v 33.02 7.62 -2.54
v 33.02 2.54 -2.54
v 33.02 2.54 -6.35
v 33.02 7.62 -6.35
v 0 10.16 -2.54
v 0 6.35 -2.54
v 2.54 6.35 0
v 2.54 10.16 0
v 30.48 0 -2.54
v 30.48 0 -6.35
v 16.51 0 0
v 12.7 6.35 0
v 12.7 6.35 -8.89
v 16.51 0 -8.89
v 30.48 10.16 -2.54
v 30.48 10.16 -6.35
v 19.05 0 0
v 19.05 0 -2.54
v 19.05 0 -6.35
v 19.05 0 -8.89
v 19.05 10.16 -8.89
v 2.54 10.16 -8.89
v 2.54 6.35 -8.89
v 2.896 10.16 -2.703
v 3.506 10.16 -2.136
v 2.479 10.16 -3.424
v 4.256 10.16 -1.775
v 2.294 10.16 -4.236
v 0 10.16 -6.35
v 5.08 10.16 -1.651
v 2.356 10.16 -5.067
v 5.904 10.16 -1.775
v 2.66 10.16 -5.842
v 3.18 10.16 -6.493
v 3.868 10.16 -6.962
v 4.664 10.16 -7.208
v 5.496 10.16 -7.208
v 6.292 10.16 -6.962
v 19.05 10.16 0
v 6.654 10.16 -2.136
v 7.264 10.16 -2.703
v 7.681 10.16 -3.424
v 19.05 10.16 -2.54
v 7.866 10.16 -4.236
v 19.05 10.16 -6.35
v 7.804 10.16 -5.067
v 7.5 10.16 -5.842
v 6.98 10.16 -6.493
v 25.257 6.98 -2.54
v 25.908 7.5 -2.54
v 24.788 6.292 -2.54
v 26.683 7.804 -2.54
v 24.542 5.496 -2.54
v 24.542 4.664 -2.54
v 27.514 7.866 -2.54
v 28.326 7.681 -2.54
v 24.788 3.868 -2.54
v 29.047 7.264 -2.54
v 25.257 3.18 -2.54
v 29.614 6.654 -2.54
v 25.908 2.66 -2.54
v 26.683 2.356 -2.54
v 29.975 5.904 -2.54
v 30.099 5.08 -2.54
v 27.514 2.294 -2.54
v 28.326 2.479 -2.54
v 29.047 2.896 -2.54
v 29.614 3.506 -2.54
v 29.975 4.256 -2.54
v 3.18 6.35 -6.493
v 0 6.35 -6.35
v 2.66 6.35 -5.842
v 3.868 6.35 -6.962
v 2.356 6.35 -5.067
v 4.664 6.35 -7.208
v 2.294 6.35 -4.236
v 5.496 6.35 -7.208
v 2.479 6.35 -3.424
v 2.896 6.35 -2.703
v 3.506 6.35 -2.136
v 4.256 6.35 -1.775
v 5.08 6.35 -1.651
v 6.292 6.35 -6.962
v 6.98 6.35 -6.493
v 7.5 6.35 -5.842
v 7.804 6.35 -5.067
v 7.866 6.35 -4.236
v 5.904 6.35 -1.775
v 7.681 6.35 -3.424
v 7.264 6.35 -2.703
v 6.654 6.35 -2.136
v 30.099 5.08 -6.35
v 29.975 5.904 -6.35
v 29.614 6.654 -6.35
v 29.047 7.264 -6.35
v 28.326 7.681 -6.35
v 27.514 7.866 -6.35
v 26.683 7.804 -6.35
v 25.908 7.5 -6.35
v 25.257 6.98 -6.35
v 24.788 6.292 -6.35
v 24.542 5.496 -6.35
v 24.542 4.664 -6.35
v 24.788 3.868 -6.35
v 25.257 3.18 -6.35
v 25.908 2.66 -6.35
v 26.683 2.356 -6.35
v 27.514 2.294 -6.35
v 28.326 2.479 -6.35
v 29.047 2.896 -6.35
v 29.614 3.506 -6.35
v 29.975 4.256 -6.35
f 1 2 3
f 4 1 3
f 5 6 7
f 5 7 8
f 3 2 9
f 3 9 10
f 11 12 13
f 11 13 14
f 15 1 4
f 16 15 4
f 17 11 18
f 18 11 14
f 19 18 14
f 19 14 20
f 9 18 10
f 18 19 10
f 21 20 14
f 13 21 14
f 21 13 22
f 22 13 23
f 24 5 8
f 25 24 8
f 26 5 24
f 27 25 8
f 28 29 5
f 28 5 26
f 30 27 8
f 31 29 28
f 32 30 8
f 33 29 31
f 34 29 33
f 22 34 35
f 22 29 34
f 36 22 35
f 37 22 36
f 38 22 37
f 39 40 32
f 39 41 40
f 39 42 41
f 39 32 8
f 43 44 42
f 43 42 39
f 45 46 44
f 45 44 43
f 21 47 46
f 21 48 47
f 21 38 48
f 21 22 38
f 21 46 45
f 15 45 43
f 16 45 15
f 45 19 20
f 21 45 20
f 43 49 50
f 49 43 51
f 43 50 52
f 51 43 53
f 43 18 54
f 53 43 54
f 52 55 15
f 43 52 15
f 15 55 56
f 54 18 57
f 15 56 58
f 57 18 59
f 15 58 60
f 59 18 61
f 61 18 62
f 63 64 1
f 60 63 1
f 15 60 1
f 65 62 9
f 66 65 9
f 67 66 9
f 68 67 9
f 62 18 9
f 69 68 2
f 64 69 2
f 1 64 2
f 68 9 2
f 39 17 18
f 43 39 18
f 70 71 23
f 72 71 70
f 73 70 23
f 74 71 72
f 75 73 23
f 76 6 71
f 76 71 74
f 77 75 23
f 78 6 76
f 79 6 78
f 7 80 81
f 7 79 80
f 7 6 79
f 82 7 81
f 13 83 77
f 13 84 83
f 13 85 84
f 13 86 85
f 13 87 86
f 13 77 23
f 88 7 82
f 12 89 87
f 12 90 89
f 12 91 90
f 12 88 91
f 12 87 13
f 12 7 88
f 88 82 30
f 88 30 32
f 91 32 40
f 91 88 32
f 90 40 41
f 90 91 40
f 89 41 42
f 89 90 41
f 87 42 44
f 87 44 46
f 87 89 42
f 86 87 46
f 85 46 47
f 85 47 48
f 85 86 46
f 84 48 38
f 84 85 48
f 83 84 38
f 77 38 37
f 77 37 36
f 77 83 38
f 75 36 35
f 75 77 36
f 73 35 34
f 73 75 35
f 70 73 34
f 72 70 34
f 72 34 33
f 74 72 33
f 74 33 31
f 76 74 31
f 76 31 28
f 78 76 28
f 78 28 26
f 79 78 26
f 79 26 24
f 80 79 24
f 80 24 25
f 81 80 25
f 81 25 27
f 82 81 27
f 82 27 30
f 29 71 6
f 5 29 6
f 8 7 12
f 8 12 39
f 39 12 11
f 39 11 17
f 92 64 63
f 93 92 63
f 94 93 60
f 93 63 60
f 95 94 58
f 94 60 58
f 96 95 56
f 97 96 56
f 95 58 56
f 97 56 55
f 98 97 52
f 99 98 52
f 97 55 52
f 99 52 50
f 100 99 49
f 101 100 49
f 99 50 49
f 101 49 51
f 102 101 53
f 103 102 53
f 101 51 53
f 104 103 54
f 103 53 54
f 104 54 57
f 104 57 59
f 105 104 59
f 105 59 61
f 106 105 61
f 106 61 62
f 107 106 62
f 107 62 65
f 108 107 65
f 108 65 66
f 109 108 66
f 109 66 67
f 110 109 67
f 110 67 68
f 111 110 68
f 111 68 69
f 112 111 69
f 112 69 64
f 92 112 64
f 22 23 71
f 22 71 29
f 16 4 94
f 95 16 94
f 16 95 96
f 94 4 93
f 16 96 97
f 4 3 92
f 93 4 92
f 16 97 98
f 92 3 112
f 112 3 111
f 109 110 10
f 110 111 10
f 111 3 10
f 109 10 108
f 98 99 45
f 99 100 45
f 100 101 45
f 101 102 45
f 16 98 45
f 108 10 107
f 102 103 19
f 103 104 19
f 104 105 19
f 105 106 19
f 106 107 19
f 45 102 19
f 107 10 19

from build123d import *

# Parameters (mm, degrees)
SKETCH1_R            = 2.794
BASE_DEPTH           = 10.16
LATCH_HOLE_REACH     = 37.126
SKETCH2_R            = 2.794
SERVO_ARM_HOLE_REACH = 37.673
CHAMFER1_SIZE        = 2.54


with BuildPart() as part:
    # Sketch1 → base (new body)
    with BuildSketch(Plane(origin=(0, 0, 0), x_dir=(1, 0, 0), z_dir=(0, 1, 0))):
        Polygon((0, 0), (19.05, 0), (19.05, 2.54), (33.02, 2.54), (33.02, 6.35), (19.05, 6.35), (19.05, 8.89), (0, 8.89), align=None)
        with Locations(Location((5.08, 4.445, 0), (0, 0, 270))):
            Circle(SKETCH1_R, mode=Mode.SUBTRACT)
    extrude(amount=BASE_DEPTH)

    # Sketch2 → latch_hole (cut, up to next)
    with BuildSketch(Plane.XY.offset(-2.54), mode=Mode.PRIVATE) as latch_hole_sk1:
        with Locations((27.305, 5.08)):
            Circle(SKETCH2_R)
    latch_hole_tool1 = extrude(latch_hole_sk1.sketch, amount=-LATCH_HOLE_REACH, mode=Mode.PRIVATE) & part.part
    add(latch_hole_tool1.solids().sort_by_distance((27.305, 5.08, -2.54))[0], mode=Mode.SUBTRACT)

    # Sketch4 → servo_arm_hole (cut, up to next)
    with BuildSketch(Plane.XY, mode=Mode.PRIVATE) as servo_arm_hole_sk1:
        Polygon((0, 6.35), (12.7, 6.35), (16.51, 0), (0, 0), align=None)
    servo_arm_hole_tool1 = extrude(servo_arm_hole_sk1.sketch, amount=-SERVO_ARM_HOLE_REACH, mode=Mode.PRIVATE) & part.part
    add(servo_arm_hole_tool1.solids().sort_by_distance((7.343913, 3.036957, 0))[0], mode=Mode.SUBTRACT)

    # Chamfer1
    chamfer1_edges = [part.edges().sort_by_distance(p)[0] for p in [
        (0, 8.255, -8.89),
        (0, 8.255, 0),
        (33.02, 10.16, -4.445),
        (33.02, 0, -4.445),
    ]]
    chamfer(chamfer1_edges, length=CHAMFER1_SIZE)


solid = part.part
